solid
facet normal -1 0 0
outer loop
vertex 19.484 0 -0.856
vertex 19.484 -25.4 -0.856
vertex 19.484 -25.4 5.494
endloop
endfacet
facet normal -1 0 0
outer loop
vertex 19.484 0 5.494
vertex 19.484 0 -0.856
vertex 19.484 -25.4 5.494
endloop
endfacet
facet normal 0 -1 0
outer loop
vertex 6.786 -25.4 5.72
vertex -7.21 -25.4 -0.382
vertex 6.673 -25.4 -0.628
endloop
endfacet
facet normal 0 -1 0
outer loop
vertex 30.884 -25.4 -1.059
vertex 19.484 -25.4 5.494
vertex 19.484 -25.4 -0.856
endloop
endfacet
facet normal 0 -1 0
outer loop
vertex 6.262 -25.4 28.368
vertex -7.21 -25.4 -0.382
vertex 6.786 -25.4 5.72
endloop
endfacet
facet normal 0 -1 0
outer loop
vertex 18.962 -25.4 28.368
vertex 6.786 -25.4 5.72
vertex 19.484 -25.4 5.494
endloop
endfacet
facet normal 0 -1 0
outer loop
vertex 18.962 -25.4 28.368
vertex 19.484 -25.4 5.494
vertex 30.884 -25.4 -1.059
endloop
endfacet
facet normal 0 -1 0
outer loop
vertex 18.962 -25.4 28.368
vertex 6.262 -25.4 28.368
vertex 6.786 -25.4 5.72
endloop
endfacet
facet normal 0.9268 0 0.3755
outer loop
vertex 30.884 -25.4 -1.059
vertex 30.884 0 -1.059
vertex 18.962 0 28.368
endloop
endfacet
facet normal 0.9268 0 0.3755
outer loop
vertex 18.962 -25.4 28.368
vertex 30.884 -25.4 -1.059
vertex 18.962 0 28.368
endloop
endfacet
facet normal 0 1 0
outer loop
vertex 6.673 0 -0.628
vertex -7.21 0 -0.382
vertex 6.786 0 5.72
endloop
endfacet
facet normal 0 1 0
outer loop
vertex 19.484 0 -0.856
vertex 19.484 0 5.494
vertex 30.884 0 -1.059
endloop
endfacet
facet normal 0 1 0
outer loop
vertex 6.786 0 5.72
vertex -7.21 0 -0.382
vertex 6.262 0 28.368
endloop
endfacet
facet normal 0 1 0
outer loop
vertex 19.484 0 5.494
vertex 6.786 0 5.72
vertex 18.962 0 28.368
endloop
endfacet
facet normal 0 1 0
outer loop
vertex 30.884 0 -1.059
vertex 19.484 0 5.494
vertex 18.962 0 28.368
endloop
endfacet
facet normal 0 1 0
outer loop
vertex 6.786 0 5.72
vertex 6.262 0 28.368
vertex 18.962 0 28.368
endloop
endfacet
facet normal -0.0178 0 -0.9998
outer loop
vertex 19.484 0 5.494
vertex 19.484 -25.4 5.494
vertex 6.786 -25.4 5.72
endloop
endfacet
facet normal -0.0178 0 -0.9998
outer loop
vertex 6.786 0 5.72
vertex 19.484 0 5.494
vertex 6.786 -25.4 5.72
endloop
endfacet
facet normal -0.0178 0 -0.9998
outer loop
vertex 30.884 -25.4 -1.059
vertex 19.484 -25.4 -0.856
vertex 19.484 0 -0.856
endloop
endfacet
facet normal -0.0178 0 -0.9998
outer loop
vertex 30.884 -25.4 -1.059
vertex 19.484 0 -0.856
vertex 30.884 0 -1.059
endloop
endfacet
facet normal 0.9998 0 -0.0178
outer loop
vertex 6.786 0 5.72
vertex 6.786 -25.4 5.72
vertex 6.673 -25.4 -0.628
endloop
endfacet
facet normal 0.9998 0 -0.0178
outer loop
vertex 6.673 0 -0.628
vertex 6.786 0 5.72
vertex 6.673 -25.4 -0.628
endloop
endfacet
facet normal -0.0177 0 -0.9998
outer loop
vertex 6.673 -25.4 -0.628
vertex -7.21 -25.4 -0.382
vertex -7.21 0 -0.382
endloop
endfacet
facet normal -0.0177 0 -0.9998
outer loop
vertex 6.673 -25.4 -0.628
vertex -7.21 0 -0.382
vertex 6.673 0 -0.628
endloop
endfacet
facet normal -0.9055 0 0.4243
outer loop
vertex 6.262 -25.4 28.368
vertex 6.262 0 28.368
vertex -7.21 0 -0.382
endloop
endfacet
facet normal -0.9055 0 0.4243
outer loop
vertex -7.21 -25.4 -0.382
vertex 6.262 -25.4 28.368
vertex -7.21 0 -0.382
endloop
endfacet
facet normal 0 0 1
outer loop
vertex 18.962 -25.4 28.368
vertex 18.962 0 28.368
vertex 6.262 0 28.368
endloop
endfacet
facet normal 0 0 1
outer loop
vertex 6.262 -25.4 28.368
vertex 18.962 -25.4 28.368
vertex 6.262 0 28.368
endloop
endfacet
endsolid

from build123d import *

# Parameters (mm, degrees)
F1_DEPTH = 25.4
F3_DEPTH = 25.4
F4_DEPTH = 50.8


with BuildPart() as f1:
    # F0 (on Front) → F1 (new body)
    with BuildSketch(Plane.XZ):
        Polygon((6.2624249645, 28.3681909489), (-7.2102827521, -0.3815681245), (30.8836984568, -1.0587650323), (18.9624249645, 28.3681909489), align=None)
    extrude(amount=F1_DEPTH)

    # F2 (on face) → F3 (join)
    with BuildSketch(Plane.XZ.offset(25.4)):
        Polygon((6.7862393458, 5.7196156272), (6.6733910244, -0.6283782675), (19.4842330822, -0.8561166753), (19.4842330822, 5.4938833247), align=None)
    extrude(amount=F3_DEPTH)

    # F4 (cut): a face of the model
    f4_faces = [f1.faces().sort_by_distance(p)[0] for p in [
        (13.1069825312, -50.8, 2.42756979),
    ]]
    extrude(f4_faces, amount=-F4_DEPTH, mode=Mode.SUBTRACT)


solid = f1.part
